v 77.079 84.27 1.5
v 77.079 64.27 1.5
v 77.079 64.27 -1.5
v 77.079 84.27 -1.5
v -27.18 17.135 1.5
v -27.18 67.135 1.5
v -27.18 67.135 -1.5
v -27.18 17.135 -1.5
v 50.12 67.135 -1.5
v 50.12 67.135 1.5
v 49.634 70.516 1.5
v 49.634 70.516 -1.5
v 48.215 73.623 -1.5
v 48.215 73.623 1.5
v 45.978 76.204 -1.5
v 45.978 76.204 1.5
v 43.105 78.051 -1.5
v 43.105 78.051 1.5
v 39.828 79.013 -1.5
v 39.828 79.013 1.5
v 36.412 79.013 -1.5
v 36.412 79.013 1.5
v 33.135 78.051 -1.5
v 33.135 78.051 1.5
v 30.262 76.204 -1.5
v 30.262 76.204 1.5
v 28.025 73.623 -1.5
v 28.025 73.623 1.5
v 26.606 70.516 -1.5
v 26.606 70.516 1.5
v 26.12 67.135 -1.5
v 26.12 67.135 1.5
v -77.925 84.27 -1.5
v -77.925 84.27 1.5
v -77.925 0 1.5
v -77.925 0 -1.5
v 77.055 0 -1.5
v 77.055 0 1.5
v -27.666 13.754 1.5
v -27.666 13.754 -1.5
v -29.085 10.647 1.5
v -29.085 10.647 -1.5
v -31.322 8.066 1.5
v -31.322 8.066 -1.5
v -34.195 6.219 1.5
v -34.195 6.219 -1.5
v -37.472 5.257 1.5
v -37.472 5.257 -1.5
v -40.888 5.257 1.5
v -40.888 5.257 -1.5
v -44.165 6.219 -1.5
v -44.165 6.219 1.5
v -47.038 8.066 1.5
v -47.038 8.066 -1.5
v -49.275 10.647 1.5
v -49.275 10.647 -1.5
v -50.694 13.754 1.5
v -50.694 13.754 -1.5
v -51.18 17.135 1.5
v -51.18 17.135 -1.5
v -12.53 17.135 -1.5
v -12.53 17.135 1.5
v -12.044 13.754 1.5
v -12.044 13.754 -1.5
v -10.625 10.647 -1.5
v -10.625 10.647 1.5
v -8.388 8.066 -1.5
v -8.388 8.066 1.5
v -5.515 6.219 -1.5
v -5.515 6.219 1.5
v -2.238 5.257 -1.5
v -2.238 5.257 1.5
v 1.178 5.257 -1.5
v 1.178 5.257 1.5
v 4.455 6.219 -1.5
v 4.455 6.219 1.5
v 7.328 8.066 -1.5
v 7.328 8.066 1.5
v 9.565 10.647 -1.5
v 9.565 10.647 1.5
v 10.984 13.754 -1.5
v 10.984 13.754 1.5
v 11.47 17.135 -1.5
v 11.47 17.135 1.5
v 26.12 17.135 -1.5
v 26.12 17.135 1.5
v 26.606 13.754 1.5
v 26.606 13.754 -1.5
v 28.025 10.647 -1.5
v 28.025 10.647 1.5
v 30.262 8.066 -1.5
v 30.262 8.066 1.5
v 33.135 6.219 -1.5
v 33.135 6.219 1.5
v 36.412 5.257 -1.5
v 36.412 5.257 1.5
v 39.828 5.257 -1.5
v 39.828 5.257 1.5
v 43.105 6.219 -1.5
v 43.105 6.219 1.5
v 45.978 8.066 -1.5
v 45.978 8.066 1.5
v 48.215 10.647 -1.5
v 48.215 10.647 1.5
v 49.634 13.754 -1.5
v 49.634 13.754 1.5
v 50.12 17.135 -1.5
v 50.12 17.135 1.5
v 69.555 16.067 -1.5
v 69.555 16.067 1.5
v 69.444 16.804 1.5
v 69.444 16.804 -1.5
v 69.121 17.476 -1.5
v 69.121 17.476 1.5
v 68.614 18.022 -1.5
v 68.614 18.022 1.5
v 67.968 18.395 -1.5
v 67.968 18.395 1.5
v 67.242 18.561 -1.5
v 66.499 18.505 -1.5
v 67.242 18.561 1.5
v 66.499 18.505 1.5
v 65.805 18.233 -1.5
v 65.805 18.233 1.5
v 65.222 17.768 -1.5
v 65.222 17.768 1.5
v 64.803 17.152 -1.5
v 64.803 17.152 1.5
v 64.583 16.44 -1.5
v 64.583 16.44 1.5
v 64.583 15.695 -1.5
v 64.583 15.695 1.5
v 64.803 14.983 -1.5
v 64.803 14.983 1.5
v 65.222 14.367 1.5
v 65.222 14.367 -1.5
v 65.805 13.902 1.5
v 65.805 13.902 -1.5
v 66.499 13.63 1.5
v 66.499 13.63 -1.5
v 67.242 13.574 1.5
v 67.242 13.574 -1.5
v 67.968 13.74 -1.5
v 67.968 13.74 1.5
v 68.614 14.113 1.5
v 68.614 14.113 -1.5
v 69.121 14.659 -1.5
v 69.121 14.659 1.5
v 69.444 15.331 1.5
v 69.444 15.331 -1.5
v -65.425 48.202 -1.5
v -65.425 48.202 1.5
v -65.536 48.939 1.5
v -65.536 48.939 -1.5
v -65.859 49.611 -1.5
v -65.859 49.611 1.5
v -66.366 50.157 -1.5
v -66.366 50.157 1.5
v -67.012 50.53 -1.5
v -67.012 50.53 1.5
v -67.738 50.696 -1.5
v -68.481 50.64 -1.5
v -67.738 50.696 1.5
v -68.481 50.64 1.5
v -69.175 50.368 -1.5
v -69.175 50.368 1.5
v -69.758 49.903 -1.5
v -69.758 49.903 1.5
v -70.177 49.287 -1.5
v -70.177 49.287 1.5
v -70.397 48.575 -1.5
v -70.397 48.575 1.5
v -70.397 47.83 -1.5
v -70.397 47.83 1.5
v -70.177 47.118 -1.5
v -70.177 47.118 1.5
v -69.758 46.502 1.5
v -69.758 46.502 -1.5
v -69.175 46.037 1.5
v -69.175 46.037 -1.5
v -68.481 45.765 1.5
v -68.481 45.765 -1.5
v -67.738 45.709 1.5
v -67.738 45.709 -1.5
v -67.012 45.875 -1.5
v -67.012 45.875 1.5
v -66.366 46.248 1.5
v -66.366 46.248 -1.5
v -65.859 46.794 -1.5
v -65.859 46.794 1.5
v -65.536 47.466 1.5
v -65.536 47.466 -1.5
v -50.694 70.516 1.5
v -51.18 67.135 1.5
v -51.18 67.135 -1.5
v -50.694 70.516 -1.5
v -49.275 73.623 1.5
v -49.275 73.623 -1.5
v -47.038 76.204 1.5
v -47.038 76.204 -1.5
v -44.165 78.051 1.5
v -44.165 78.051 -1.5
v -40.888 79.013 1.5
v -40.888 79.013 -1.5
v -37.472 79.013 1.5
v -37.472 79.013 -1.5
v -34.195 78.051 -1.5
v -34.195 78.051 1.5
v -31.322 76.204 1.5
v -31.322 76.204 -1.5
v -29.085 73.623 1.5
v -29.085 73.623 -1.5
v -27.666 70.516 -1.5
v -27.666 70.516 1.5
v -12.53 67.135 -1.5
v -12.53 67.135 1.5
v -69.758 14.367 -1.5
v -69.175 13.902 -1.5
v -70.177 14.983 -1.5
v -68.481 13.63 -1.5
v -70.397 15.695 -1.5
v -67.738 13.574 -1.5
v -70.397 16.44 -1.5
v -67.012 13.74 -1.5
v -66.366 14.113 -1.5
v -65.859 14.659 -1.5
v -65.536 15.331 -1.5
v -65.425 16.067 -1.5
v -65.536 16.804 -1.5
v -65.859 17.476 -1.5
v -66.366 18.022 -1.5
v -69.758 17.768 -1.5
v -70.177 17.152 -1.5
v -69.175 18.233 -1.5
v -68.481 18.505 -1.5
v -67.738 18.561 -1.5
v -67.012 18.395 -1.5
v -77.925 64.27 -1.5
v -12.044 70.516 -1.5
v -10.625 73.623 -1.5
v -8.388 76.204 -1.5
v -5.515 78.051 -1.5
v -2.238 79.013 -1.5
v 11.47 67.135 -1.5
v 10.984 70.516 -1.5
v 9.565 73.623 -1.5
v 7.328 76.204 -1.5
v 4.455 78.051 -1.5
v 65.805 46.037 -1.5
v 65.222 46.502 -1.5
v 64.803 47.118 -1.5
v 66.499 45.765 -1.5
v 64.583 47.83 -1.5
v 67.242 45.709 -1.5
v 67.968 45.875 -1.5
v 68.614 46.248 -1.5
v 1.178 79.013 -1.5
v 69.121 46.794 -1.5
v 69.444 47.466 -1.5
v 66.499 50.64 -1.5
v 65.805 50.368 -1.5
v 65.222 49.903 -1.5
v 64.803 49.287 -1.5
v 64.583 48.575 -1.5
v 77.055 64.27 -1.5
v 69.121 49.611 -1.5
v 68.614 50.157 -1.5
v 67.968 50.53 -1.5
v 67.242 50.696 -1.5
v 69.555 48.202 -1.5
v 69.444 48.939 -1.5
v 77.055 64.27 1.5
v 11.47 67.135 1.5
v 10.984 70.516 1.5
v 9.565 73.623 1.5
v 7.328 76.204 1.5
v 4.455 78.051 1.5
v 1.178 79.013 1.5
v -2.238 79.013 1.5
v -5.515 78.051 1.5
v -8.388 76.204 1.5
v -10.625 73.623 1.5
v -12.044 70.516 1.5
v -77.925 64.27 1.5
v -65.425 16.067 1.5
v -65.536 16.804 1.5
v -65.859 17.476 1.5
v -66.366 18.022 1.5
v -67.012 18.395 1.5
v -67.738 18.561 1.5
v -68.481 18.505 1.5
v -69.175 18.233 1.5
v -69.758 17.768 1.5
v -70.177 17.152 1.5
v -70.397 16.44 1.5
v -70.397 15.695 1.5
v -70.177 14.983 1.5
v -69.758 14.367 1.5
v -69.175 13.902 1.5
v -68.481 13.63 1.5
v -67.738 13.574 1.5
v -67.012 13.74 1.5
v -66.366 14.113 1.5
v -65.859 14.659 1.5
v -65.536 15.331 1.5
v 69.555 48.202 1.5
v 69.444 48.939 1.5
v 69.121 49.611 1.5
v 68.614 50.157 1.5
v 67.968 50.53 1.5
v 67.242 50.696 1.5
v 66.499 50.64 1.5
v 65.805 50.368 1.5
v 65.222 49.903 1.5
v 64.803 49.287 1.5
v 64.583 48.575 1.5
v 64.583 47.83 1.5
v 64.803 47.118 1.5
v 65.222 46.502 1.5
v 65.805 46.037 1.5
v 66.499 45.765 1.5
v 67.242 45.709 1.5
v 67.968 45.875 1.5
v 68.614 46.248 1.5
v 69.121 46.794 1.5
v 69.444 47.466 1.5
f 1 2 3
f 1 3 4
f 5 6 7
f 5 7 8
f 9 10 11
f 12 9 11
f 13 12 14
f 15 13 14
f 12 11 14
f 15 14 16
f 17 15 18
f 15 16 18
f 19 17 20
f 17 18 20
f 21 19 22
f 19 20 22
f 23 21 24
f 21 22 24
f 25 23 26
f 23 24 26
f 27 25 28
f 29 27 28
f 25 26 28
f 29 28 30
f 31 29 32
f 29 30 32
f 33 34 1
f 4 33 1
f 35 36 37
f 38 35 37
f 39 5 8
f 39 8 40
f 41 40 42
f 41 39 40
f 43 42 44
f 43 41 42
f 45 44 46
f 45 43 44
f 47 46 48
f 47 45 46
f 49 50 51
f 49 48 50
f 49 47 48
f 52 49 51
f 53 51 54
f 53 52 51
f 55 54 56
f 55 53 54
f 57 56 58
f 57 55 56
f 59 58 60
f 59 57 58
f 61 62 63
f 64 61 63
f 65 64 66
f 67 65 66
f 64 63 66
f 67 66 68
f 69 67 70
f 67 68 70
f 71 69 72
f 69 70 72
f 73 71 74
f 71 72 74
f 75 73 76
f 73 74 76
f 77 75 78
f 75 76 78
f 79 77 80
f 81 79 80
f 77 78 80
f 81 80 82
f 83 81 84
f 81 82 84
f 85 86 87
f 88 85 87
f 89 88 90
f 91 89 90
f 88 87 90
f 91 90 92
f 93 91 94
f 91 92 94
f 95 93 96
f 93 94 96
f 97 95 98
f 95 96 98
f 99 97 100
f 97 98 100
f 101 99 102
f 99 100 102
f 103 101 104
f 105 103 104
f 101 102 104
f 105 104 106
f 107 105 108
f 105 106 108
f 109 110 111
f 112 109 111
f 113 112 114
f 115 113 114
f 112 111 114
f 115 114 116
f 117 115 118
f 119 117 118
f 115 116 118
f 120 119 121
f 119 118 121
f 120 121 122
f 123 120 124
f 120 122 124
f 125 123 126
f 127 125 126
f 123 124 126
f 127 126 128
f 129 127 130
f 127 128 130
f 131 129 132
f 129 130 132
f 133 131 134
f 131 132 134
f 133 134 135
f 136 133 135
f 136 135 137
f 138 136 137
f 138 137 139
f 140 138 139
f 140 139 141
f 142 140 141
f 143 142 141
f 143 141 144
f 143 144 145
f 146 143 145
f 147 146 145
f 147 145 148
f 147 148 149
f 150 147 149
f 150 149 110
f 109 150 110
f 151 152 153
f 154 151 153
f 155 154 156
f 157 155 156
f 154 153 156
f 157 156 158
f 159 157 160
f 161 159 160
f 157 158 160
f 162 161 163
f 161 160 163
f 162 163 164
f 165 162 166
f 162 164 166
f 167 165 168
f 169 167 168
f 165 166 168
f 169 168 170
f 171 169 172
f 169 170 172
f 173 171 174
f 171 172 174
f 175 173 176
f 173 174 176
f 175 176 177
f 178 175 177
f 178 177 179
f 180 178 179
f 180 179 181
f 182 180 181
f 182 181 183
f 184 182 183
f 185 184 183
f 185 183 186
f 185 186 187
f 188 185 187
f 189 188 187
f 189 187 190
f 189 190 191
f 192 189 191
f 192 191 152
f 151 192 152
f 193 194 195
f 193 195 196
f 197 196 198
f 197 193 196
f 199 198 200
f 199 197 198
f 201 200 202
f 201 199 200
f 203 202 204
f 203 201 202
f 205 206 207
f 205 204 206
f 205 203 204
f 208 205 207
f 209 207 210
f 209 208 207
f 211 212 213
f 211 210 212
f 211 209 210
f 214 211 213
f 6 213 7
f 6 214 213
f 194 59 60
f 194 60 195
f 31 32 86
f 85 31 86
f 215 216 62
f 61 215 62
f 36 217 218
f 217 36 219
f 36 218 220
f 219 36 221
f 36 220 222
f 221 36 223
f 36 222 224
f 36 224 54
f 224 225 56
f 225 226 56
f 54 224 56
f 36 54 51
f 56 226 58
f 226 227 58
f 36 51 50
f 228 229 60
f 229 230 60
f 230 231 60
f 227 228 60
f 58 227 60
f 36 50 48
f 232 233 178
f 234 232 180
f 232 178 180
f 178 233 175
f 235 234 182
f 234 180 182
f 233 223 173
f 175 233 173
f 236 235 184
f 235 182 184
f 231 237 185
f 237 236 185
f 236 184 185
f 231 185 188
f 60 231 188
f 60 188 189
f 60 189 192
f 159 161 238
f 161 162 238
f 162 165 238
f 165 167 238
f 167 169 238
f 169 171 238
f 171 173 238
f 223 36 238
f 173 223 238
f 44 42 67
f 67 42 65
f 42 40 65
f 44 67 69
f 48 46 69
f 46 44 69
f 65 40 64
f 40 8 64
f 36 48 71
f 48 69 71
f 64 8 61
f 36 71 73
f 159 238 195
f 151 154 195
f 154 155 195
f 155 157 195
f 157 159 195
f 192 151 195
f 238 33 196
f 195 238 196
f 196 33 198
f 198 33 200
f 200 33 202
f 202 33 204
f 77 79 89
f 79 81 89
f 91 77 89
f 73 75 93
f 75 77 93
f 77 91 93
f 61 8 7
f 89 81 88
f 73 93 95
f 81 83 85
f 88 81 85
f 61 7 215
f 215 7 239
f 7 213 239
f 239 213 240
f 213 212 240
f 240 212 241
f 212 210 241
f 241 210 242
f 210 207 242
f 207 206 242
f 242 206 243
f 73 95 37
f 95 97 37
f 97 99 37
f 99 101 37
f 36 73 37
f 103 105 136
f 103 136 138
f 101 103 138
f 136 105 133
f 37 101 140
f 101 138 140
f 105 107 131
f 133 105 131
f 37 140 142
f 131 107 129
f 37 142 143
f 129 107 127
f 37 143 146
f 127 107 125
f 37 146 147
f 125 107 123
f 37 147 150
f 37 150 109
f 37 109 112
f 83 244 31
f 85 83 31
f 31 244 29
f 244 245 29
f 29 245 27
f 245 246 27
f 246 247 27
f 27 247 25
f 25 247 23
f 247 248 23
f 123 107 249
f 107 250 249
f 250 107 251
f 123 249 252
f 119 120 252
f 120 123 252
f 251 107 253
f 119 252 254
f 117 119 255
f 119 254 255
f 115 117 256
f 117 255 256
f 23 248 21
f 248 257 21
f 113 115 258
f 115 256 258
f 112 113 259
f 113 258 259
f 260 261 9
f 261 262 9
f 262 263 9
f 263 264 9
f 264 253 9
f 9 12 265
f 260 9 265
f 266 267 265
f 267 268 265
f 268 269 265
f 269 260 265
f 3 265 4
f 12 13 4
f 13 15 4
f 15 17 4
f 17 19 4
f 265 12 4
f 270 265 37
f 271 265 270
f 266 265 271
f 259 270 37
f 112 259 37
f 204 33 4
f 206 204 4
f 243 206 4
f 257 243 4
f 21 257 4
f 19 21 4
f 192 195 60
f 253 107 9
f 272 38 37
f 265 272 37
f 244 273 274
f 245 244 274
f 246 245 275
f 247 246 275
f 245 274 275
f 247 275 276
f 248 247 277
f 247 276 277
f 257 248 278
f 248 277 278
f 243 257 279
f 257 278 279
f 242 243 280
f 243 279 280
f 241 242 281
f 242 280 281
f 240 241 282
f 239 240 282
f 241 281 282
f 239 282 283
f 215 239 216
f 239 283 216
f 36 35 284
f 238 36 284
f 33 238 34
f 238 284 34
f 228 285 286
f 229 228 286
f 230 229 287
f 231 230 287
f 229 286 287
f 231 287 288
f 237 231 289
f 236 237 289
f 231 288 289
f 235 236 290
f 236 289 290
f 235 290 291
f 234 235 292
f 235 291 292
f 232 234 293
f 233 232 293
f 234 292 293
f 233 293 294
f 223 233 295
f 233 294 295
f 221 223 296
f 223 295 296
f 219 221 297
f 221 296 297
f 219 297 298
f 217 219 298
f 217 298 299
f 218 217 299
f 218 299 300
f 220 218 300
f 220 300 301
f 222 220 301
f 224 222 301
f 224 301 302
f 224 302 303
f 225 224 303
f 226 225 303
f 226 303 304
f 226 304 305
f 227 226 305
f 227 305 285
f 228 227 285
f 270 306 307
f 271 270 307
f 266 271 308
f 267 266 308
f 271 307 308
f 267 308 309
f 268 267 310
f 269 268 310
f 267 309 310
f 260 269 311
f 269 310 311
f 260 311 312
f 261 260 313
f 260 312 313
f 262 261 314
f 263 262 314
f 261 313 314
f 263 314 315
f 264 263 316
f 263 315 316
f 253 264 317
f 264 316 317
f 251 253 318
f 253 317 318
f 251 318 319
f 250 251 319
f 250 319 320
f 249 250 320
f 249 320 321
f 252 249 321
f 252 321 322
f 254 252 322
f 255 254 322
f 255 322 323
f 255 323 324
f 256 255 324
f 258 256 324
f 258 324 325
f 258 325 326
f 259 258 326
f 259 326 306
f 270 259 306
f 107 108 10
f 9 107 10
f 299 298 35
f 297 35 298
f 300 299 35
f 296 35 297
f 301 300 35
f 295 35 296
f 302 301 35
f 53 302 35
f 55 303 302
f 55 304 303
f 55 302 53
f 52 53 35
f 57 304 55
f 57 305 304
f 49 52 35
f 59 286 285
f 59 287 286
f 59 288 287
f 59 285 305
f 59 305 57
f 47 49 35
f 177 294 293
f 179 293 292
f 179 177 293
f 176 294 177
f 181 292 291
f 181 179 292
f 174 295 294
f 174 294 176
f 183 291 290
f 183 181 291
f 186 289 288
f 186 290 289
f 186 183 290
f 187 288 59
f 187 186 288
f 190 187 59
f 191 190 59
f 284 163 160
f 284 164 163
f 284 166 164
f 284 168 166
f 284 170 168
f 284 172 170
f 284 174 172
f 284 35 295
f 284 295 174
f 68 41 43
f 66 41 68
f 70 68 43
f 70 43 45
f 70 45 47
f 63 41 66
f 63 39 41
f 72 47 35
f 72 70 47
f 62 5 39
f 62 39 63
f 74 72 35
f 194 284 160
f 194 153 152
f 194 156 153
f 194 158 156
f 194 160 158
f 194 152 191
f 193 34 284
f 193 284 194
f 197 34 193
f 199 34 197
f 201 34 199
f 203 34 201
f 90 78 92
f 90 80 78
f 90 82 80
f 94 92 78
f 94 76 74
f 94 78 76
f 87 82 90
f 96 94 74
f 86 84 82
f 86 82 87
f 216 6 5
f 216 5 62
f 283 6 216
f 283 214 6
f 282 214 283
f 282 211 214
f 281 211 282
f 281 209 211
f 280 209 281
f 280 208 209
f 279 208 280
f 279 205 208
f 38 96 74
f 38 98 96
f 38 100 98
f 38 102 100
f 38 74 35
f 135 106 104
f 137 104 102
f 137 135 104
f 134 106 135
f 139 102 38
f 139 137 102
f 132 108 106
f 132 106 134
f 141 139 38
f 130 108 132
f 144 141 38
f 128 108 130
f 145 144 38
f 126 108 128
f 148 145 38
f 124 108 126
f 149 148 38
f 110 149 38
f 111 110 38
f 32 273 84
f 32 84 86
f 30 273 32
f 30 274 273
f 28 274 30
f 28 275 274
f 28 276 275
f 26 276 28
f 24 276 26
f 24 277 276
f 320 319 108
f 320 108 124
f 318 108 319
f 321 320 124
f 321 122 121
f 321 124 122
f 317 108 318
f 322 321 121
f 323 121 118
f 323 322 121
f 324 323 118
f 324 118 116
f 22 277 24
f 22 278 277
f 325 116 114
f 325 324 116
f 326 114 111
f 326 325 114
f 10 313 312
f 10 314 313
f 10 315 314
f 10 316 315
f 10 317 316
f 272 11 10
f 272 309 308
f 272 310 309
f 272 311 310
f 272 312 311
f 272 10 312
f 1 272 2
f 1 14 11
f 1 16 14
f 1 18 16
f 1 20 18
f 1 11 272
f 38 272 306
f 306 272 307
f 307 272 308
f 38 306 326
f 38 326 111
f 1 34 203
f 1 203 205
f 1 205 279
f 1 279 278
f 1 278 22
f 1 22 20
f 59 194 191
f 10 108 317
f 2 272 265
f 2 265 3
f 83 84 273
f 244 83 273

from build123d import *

# Parameters (mm, degrees)
ESQUISSE2_W             = 154.98
ESQUISSE2_H             = 3
BOSS_EXTRU_1_DEPTH      = 64.27
ESQUISSE3_R             = 2.5
ENL_V_MAT_EXTRU_1_DEPTH = 102.054178938
ENL_V_MAT_EXTRU_2_DEPTH = 102.054178938
SKETCH1_W               = 155.004364221
SKETCH1_H               = 20
BOSS_EXTRUDE1_DEPTH     = 3
CUT_EXTRUDE1_DEPTH      = 10


with BuildPart() as part:
    # Esquisse2 → Boss.-Extru.1 (new body)
    with BuildSketch(Plane(origin=(0, 0, 0), x_dir=(1, 0, 0), z_dir=(0, 1, 0))):
        with Locations((-0.435054897, 0)):
            Rectangle(ESQUISSE2_W, ESQUISSE2_H)
    extrude(amount=BOSS_EXTRU_1_DEPTH)

    # Esquisse3 → Enlèv. mat.-Extru.1 (cut, through all)
    with BuildSketch(Plane.XY.offset(1.5)):
        with Locations((-67.925054897, 16.0675)):
            Circle(ESQUISSE3_R)
        with Locations((-67.925054897, 48.2025)):
            Circle(ESQUISSE3_R)
        with Locations((67.054945103, 48.2025)):
            Circle(ESQUISSE3_R)
        with Locations((67.054945103, 16.0675)):
            Circle(ESQUISSE3_R)
    extrude(amount=-ENL_V_MAT_EXTRU_1_DEPTH, mode=Mode.SUBTRACT)

    # Esquisse4 → Enlèv. mat.-Extru.2 (cut, through all)
    with BuildSketch(Plane.XY.offset(1.5)):
        with BuildLine():
            Line((-41.680054897, 47.135), (-41.680054897, 17.135))
            ThreePointArc((-41.680054897, 17.135), (-39.180054897, 14.635), (-36.680054897, 17.135))
            Line((-36.680054897, 17.135), (-36.680054897, 47.135))
            ThreePointArc((-36.680054897, 47.135), (-39.180054897, 49.635), (-41.680054897, 47.135))
        make_face()
        with BuildLine():
            Line((-2.935054897, 47.135), (-2.935054897, 17.135))
            ThreePointArc((-2.935054897, 17.135), (-0.435054897, 14.635), (2.064945103, 17.135))
            Line((2.064945103, 17.135), (2.064945103, 47.135))
            ThreePointArc((2.064945103, 47.135), (-0.435054897, 49.635), (-2.935054897, 47.135))
        make_face()
        with BuildLine():
            Line((35.809945103, 47.135), (35.809945103, 17.135))
            ThreePointArc((35.809945103, 17.135), (38.309945103, 14.635), (40.809945103, 17.135))
            Line((40.809945103, 17.135), (40.809945103, 47.135))
            ThreePointArc((40.809945103, 47.135), (38.309945103, 49.635), (35.809945103, 47.135))
        make_face()
    extrude(amount=-ENL_V_MAT_EXTRU_2_DEPTH, mode=Mode.SUBTRACT)

    # Sketch1 → Boss-Extrude1 (add)
    with BuildSketch(Plane.XY.offset(1.5)):
        with Locations((-0.422872787, 74.27)):
            Rectangle(SKETCH1_W, SKETCH1_H)
    extrude(amount=-BOSS_EXTRUDE1_DEPTH)

    # Sketch2 → Cut-Extrude1 (cut)
    with BuildSketch(Plane.XY.offset(1.5)):
        with BuildLine():
            Line((-27.180054897, 67.135), (-27.180054897, 17.135))
            ThreePointArc((-27.180054897, 17.135), (-39.180054897, 5.135), (-51.180054897, 17.135))
            Line((-51.180054897, 17.135), (-51.180054897, 67.135))
            ThreePointArc((-51.180054897, 67.135), (-39.180054897, 79.135), (-27.180054897, 67.135))
        make_face()
        with BuildLine():
            Line((-12.530054897, 67.135), (-12.530054897, 17.135))
            ThreePointArc((-12.530054897, 17.135), (-0.530054897, 5.135), (11.469945103, 17.135))
            Line((11.469945103, 17.135), (11.469945103, 67.135))
            ThreePointArc((11.469945103, 67.135), (-0.530054897, 79.135), (-12.530054897, 67.135))
        make_face()
        with BuildLine():
            Line((26.119945103, 67.135), (26.119945103, 17.135))
            ThreePointArc((26.119945103, 17.135), (38.119945103, 5.135), (50.119945103, 17.135))
            Line((50.119945103, 17.135), (50.119945103, 67.135))
            ThreePointArc((50.119945103, 67.135), (38.119945103, 79.135), (26.119945103, 67.135))
        make_face()
    extrude(amount=-CUT_EXTRUDE1_DEPTH, mode=Mode.SUBTRACT)


solid = part.part
